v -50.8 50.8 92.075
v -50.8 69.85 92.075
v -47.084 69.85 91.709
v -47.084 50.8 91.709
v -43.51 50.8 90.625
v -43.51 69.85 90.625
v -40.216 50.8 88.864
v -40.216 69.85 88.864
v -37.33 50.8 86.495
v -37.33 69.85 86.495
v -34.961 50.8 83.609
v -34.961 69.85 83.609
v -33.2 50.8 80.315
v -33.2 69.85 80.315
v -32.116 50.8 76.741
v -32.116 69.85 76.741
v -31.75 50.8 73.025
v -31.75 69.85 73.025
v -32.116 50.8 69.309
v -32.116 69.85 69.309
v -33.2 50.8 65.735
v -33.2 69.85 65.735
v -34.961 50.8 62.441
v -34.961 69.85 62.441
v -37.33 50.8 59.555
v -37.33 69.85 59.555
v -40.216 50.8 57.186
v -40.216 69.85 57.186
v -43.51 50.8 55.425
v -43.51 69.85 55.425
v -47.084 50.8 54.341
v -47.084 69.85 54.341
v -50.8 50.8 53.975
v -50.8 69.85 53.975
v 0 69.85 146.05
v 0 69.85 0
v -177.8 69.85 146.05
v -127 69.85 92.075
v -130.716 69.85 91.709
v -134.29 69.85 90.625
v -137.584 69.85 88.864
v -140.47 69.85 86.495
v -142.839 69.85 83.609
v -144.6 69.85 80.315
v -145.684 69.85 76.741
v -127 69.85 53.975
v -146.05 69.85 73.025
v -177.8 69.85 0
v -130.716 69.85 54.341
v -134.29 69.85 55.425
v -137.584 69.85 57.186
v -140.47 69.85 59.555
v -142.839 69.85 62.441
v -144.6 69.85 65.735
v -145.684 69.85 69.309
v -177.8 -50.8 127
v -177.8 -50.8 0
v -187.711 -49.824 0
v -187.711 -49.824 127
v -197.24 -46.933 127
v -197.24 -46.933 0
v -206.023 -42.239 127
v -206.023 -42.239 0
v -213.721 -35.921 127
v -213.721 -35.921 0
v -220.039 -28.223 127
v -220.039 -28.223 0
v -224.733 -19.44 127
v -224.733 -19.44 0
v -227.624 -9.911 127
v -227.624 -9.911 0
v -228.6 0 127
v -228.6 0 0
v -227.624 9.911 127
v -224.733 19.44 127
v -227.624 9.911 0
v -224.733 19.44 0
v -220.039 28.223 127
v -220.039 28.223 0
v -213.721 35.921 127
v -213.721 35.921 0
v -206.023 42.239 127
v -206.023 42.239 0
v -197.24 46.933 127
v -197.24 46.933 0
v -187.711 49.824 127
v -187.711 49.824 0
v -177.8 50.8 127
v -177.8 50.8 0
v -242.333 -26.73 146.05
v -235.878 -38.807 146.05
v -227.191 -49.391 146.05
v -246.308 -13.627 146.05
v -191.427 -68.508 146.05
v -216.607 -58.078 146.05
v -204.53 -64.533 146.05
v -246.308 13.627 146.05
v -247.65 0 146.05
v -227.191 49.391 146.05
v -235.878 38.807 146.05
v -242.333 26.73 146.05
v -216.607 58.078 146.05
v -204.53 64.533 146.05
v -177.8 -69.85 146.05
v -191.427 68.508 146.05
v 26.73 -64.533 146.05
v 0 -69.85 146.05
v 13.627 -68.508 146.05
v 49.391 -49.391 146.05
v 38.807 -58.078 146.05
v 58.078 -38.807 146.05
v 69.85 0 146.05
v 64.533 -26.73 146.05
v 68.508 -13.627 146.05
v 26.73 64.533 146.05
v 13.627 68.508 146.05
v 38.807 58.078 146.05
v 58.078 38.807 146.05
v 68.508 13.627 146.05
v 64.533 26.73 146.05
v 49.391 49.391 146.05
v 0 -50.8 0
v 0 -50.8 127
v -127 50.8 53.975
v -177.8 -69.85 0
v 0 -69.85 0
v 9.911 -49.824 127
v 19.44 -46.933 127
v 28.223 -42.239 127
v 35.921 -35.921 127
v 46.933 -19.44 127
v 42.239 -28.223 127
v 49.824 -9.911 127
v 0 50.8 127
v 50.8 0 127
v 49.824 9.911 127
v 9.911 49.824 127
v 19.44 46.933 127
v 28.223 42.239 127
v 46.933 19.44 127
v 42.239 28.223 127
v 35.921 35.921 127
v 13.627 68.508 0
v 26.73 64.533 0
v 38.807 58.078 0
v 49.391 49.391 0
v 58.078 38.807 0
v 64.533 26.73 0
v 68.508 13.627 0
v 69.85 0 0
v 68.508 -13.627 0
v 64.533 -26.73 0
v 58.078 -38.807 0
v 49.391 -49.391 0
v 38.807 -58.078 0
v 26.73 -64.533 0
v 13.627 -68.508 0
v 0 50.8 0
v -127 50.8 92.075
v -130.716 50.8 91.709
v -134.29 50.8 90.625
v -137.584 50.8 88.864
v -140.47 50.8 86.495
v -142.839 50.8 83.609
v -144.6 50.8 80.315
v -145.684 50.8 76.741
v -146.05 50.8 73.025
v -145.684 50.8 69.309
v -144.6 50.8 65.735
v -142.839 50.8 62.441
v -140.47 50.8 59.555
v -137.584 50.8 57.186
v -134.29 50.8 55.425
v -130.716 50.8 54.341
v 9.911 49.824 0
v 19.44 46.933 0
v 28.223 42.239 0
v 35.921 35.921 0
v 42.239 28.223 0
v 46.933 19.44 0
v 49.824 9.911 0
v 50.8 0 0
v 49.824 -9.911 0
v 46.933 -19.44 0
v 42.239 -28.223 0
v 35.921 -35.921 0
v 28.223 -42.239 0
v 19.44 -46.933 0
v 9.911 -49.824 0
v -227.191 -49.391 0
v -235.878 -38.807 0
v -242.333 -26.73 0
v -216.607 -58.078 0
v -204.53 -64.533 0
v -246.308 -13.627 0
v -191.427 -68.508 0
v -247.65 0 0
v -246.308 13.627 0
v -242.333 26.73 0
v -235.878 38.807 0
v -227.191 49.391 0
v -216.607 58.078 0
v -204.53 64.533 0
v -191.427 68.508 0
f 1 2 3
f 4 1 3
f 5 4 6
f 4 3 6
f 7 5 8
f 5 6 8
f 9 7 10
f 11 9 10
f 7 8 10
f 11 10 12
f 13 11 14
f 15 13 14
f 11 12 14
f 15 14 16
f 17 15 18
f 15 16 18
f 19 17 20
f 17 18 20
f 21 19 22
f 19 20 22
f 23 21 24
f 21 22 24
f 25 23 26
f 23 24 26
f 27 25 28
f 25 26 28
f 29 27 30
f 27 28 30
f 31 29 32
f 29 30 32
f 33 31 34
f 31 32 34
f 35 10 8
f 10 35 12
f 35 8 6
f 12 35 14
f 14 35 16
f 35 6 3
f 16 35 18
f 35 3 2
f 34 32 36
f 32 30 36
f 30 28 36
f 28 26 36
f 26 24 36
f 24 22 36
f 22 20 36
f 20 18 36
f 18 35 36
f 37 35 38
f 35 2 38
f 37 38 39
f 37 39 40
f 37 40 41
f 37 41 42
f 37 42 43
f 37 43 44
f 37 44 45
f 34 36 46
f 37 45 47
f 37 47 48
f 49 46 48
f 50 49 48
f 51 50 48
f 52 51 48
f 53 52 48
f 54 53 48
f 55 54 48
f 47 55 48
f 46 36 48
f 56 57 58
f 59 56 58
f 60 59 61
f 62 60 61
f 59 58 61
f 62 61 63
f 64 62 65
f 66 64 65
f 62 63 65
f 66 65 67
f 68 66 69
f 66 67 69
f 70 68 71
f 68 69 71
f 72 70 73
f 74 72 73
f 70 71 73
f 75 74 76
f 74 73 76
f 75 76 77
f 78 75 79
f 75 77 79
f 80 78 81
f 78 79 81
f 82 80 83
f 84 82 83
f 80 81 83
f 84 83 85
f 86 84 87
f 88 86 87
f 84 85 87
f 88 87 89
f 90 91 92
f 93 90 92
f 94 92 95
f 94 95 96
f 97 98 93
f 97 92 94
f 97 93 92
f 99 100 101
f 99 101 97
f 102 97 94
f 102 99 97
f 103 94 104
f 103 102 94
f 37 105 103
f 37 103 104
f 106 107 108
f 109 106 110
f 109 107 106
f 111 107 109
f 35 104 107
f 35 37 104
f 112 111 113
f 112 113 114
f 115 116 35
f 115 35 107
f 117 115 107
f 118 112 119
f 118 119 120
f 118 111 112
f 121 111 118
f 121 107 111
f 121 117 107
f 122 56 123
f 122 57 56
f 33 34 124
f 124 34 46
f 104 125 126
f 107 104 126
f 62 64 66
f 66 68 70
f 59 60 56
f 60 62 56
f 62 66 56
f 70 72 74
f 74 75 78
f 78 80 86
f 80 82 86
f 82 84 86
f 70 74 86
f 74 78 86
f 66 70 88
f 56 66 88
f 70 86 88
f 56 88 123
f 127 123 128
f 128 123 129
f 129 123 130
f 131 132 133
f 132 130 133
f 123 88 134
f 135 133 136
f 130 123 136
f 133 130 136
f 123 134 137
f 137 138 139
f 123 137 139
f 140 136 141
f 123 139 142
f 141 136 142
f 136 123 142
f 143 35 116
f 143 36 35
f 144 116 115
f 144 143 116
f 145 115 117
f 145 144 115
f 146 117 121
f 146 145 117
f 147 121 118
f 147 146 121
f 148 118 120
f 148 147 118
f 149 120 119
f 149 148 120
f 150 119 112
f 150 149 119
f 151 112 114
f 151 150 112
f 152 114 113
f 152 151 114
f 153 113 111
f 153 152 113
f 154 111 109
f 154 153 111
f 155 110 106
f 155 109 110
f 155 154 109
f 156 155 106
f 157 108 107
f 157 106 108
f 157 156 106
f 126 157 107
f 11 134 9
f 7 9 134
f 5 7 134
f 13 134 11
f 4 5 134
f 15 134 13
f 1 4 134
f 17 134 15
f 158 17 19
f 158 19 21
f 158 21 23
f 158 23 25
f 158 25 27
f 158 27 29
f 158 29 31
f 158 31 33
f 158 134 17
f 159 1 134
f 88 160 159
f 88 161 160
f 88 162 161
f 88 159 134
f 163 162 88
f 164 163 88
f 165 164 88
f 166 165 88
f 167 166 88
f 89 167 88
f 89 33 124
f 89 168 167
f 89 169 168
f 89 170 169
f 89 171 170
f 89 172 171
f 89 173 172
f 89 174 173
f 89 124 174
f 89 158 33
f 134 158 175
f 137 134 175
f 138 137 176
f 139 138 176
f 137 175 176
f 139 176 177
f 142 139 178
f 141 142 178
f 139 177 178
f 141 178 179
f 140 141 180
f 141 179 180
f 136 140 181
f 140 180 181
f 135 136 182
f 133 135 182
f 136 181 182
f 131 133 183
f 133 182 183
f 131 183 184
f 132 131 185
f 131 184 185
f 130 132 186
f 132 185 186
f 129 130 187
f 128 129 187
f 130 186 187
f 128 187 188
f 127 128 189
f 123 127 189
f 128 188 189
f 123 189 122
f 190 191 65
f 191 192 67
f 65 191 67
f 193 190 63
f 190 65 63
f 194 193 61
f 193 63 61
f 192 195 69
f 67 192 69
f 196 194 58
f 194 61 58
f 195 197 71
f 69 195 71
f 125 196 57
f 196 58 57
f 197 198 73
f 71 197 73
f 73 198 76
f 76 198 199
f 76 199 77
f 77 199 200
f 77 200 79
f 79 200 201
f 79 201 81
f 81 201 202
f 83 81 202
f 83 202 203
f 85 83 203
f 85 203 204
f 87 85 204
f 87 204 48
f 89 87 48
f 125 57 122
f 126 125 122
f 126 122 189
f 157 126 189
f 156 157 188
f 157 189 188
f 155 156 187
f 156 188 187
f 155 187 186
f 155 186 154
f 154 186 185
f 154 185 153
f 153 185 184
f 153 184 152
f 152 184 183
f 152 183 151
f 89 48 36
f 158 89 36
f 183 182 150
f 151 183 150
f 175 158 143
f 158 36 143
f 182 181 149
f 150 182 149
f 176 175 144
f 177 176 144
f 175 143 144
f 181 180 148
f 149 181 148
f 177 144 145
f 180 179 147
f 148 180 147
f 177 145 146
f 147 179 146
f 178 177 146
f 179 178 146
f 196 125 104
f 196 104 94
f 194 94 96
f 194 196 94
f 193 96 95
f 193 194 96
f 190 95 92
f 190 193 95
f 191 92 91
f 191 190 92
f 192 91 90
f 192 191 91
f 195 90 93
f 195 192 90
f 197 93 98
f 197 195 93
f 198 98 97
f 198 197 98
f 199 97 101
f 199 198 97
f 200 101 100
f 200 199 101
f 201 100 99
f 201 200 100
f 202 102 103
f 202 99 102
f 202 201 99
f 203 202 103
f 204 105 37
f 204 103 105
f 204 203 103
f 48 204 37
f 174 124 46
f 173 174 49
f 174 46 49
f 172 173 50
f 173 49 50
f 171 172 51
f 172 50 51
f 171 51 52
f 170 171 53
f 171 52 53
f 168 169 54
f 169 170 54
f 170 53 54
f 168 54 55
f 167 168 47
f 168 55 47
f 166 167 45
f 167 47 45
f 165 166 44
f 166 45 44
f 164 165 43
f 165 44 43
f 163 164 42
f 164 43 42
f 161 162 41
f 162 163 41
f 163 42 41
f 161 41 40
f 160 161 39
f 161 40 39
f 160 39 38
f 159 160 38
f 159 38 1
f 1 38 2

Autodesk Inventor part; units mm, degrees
ref_plane "YZ Plane" through (0, 0, 0) normal (1, 0, 0) x (0, 1, 0)
ref_plane "XZ Plane" through (0, 0, 0) normal (0, 1, 0) x (-1, 0, 0)
ref_plane "XY Plane" through (0, 0, 0) normal (0, 0, 1) x (1, 0, 0)
sketch "Sketch1" plane through (0, 0, 0) normal (0, 0, 1) x (1, 0, 0)
  line L0 (0, 0) -> (-177.8, 0) construction
  line L1 (0, 69.85) -> (-177.8, 69.85)
  line L2 (-177.8, -69.85) -> (0, -69.85)
  arc A0 (0, -69.85) -> (0, 69.85) centre (0, 0) ccw
  arc A1 (-177.8, 69.85) -> (-177.8, -69.85) centre (-177.8, 0) ccw
  point P0 (-88.9, 0)
  dimension "d0" = 177.8
  dimension "d1" = 139.7
extrude "Extrusion1" add sketch "Sketch1" along normal blind 146.05
shell "Shell1" thickness 19.05 removed faces 1 at (-59.2667, -23.2833, 0)
sketch "Sketch2" plane through (-177.8, 69.85, 0) normal (0, 1, 0) x (1, 0, 0)
  line L0 (177.8, 0) -> (0, 0) projected
  line L1 (0, 0) -> (0, -146.05) projected
  line L2 (177.8, -146.05) -> (0, -146.05) projected
  line L3 (177.8, 0) -> (177.8, -146.05) projected
  line L4 (0, 0) -> (0, -146.05) projected
  line L5 (0, -73.025) -> (177.8, -73.025)
  line L6 (177.8, 0) -> (177.8, -127) projected
  line L7 (177.8, 0) -> (177.8, -146.05) projected
  line L8 (127, -73.025) -> (50.8, -73.025) construction
  line L9 (127, -53.975) -> (50.8, -53.975)
  line L10 (50.8, -92.075) -> (127, -92.075)
  arc A0 (127, -92.075) -> (127, -53.975) centre (127, -73.025) ccw
  arc A1 (50.8, -53.975) -> (50.8, -92.075) centre (50.8, -73.025) ccw
  point P0 (88.9, -73.025)
  dimension "d10" = 38.1
  dimension "d11" = 38.1
extrude "Extrusion2" cut sketch "Sketch2" against normal up to surface (19.05 mm away) contours A0 L10 A1 L5 | L5 A1 L9 A0
properties part number "Concrete case" material "GFRC"
